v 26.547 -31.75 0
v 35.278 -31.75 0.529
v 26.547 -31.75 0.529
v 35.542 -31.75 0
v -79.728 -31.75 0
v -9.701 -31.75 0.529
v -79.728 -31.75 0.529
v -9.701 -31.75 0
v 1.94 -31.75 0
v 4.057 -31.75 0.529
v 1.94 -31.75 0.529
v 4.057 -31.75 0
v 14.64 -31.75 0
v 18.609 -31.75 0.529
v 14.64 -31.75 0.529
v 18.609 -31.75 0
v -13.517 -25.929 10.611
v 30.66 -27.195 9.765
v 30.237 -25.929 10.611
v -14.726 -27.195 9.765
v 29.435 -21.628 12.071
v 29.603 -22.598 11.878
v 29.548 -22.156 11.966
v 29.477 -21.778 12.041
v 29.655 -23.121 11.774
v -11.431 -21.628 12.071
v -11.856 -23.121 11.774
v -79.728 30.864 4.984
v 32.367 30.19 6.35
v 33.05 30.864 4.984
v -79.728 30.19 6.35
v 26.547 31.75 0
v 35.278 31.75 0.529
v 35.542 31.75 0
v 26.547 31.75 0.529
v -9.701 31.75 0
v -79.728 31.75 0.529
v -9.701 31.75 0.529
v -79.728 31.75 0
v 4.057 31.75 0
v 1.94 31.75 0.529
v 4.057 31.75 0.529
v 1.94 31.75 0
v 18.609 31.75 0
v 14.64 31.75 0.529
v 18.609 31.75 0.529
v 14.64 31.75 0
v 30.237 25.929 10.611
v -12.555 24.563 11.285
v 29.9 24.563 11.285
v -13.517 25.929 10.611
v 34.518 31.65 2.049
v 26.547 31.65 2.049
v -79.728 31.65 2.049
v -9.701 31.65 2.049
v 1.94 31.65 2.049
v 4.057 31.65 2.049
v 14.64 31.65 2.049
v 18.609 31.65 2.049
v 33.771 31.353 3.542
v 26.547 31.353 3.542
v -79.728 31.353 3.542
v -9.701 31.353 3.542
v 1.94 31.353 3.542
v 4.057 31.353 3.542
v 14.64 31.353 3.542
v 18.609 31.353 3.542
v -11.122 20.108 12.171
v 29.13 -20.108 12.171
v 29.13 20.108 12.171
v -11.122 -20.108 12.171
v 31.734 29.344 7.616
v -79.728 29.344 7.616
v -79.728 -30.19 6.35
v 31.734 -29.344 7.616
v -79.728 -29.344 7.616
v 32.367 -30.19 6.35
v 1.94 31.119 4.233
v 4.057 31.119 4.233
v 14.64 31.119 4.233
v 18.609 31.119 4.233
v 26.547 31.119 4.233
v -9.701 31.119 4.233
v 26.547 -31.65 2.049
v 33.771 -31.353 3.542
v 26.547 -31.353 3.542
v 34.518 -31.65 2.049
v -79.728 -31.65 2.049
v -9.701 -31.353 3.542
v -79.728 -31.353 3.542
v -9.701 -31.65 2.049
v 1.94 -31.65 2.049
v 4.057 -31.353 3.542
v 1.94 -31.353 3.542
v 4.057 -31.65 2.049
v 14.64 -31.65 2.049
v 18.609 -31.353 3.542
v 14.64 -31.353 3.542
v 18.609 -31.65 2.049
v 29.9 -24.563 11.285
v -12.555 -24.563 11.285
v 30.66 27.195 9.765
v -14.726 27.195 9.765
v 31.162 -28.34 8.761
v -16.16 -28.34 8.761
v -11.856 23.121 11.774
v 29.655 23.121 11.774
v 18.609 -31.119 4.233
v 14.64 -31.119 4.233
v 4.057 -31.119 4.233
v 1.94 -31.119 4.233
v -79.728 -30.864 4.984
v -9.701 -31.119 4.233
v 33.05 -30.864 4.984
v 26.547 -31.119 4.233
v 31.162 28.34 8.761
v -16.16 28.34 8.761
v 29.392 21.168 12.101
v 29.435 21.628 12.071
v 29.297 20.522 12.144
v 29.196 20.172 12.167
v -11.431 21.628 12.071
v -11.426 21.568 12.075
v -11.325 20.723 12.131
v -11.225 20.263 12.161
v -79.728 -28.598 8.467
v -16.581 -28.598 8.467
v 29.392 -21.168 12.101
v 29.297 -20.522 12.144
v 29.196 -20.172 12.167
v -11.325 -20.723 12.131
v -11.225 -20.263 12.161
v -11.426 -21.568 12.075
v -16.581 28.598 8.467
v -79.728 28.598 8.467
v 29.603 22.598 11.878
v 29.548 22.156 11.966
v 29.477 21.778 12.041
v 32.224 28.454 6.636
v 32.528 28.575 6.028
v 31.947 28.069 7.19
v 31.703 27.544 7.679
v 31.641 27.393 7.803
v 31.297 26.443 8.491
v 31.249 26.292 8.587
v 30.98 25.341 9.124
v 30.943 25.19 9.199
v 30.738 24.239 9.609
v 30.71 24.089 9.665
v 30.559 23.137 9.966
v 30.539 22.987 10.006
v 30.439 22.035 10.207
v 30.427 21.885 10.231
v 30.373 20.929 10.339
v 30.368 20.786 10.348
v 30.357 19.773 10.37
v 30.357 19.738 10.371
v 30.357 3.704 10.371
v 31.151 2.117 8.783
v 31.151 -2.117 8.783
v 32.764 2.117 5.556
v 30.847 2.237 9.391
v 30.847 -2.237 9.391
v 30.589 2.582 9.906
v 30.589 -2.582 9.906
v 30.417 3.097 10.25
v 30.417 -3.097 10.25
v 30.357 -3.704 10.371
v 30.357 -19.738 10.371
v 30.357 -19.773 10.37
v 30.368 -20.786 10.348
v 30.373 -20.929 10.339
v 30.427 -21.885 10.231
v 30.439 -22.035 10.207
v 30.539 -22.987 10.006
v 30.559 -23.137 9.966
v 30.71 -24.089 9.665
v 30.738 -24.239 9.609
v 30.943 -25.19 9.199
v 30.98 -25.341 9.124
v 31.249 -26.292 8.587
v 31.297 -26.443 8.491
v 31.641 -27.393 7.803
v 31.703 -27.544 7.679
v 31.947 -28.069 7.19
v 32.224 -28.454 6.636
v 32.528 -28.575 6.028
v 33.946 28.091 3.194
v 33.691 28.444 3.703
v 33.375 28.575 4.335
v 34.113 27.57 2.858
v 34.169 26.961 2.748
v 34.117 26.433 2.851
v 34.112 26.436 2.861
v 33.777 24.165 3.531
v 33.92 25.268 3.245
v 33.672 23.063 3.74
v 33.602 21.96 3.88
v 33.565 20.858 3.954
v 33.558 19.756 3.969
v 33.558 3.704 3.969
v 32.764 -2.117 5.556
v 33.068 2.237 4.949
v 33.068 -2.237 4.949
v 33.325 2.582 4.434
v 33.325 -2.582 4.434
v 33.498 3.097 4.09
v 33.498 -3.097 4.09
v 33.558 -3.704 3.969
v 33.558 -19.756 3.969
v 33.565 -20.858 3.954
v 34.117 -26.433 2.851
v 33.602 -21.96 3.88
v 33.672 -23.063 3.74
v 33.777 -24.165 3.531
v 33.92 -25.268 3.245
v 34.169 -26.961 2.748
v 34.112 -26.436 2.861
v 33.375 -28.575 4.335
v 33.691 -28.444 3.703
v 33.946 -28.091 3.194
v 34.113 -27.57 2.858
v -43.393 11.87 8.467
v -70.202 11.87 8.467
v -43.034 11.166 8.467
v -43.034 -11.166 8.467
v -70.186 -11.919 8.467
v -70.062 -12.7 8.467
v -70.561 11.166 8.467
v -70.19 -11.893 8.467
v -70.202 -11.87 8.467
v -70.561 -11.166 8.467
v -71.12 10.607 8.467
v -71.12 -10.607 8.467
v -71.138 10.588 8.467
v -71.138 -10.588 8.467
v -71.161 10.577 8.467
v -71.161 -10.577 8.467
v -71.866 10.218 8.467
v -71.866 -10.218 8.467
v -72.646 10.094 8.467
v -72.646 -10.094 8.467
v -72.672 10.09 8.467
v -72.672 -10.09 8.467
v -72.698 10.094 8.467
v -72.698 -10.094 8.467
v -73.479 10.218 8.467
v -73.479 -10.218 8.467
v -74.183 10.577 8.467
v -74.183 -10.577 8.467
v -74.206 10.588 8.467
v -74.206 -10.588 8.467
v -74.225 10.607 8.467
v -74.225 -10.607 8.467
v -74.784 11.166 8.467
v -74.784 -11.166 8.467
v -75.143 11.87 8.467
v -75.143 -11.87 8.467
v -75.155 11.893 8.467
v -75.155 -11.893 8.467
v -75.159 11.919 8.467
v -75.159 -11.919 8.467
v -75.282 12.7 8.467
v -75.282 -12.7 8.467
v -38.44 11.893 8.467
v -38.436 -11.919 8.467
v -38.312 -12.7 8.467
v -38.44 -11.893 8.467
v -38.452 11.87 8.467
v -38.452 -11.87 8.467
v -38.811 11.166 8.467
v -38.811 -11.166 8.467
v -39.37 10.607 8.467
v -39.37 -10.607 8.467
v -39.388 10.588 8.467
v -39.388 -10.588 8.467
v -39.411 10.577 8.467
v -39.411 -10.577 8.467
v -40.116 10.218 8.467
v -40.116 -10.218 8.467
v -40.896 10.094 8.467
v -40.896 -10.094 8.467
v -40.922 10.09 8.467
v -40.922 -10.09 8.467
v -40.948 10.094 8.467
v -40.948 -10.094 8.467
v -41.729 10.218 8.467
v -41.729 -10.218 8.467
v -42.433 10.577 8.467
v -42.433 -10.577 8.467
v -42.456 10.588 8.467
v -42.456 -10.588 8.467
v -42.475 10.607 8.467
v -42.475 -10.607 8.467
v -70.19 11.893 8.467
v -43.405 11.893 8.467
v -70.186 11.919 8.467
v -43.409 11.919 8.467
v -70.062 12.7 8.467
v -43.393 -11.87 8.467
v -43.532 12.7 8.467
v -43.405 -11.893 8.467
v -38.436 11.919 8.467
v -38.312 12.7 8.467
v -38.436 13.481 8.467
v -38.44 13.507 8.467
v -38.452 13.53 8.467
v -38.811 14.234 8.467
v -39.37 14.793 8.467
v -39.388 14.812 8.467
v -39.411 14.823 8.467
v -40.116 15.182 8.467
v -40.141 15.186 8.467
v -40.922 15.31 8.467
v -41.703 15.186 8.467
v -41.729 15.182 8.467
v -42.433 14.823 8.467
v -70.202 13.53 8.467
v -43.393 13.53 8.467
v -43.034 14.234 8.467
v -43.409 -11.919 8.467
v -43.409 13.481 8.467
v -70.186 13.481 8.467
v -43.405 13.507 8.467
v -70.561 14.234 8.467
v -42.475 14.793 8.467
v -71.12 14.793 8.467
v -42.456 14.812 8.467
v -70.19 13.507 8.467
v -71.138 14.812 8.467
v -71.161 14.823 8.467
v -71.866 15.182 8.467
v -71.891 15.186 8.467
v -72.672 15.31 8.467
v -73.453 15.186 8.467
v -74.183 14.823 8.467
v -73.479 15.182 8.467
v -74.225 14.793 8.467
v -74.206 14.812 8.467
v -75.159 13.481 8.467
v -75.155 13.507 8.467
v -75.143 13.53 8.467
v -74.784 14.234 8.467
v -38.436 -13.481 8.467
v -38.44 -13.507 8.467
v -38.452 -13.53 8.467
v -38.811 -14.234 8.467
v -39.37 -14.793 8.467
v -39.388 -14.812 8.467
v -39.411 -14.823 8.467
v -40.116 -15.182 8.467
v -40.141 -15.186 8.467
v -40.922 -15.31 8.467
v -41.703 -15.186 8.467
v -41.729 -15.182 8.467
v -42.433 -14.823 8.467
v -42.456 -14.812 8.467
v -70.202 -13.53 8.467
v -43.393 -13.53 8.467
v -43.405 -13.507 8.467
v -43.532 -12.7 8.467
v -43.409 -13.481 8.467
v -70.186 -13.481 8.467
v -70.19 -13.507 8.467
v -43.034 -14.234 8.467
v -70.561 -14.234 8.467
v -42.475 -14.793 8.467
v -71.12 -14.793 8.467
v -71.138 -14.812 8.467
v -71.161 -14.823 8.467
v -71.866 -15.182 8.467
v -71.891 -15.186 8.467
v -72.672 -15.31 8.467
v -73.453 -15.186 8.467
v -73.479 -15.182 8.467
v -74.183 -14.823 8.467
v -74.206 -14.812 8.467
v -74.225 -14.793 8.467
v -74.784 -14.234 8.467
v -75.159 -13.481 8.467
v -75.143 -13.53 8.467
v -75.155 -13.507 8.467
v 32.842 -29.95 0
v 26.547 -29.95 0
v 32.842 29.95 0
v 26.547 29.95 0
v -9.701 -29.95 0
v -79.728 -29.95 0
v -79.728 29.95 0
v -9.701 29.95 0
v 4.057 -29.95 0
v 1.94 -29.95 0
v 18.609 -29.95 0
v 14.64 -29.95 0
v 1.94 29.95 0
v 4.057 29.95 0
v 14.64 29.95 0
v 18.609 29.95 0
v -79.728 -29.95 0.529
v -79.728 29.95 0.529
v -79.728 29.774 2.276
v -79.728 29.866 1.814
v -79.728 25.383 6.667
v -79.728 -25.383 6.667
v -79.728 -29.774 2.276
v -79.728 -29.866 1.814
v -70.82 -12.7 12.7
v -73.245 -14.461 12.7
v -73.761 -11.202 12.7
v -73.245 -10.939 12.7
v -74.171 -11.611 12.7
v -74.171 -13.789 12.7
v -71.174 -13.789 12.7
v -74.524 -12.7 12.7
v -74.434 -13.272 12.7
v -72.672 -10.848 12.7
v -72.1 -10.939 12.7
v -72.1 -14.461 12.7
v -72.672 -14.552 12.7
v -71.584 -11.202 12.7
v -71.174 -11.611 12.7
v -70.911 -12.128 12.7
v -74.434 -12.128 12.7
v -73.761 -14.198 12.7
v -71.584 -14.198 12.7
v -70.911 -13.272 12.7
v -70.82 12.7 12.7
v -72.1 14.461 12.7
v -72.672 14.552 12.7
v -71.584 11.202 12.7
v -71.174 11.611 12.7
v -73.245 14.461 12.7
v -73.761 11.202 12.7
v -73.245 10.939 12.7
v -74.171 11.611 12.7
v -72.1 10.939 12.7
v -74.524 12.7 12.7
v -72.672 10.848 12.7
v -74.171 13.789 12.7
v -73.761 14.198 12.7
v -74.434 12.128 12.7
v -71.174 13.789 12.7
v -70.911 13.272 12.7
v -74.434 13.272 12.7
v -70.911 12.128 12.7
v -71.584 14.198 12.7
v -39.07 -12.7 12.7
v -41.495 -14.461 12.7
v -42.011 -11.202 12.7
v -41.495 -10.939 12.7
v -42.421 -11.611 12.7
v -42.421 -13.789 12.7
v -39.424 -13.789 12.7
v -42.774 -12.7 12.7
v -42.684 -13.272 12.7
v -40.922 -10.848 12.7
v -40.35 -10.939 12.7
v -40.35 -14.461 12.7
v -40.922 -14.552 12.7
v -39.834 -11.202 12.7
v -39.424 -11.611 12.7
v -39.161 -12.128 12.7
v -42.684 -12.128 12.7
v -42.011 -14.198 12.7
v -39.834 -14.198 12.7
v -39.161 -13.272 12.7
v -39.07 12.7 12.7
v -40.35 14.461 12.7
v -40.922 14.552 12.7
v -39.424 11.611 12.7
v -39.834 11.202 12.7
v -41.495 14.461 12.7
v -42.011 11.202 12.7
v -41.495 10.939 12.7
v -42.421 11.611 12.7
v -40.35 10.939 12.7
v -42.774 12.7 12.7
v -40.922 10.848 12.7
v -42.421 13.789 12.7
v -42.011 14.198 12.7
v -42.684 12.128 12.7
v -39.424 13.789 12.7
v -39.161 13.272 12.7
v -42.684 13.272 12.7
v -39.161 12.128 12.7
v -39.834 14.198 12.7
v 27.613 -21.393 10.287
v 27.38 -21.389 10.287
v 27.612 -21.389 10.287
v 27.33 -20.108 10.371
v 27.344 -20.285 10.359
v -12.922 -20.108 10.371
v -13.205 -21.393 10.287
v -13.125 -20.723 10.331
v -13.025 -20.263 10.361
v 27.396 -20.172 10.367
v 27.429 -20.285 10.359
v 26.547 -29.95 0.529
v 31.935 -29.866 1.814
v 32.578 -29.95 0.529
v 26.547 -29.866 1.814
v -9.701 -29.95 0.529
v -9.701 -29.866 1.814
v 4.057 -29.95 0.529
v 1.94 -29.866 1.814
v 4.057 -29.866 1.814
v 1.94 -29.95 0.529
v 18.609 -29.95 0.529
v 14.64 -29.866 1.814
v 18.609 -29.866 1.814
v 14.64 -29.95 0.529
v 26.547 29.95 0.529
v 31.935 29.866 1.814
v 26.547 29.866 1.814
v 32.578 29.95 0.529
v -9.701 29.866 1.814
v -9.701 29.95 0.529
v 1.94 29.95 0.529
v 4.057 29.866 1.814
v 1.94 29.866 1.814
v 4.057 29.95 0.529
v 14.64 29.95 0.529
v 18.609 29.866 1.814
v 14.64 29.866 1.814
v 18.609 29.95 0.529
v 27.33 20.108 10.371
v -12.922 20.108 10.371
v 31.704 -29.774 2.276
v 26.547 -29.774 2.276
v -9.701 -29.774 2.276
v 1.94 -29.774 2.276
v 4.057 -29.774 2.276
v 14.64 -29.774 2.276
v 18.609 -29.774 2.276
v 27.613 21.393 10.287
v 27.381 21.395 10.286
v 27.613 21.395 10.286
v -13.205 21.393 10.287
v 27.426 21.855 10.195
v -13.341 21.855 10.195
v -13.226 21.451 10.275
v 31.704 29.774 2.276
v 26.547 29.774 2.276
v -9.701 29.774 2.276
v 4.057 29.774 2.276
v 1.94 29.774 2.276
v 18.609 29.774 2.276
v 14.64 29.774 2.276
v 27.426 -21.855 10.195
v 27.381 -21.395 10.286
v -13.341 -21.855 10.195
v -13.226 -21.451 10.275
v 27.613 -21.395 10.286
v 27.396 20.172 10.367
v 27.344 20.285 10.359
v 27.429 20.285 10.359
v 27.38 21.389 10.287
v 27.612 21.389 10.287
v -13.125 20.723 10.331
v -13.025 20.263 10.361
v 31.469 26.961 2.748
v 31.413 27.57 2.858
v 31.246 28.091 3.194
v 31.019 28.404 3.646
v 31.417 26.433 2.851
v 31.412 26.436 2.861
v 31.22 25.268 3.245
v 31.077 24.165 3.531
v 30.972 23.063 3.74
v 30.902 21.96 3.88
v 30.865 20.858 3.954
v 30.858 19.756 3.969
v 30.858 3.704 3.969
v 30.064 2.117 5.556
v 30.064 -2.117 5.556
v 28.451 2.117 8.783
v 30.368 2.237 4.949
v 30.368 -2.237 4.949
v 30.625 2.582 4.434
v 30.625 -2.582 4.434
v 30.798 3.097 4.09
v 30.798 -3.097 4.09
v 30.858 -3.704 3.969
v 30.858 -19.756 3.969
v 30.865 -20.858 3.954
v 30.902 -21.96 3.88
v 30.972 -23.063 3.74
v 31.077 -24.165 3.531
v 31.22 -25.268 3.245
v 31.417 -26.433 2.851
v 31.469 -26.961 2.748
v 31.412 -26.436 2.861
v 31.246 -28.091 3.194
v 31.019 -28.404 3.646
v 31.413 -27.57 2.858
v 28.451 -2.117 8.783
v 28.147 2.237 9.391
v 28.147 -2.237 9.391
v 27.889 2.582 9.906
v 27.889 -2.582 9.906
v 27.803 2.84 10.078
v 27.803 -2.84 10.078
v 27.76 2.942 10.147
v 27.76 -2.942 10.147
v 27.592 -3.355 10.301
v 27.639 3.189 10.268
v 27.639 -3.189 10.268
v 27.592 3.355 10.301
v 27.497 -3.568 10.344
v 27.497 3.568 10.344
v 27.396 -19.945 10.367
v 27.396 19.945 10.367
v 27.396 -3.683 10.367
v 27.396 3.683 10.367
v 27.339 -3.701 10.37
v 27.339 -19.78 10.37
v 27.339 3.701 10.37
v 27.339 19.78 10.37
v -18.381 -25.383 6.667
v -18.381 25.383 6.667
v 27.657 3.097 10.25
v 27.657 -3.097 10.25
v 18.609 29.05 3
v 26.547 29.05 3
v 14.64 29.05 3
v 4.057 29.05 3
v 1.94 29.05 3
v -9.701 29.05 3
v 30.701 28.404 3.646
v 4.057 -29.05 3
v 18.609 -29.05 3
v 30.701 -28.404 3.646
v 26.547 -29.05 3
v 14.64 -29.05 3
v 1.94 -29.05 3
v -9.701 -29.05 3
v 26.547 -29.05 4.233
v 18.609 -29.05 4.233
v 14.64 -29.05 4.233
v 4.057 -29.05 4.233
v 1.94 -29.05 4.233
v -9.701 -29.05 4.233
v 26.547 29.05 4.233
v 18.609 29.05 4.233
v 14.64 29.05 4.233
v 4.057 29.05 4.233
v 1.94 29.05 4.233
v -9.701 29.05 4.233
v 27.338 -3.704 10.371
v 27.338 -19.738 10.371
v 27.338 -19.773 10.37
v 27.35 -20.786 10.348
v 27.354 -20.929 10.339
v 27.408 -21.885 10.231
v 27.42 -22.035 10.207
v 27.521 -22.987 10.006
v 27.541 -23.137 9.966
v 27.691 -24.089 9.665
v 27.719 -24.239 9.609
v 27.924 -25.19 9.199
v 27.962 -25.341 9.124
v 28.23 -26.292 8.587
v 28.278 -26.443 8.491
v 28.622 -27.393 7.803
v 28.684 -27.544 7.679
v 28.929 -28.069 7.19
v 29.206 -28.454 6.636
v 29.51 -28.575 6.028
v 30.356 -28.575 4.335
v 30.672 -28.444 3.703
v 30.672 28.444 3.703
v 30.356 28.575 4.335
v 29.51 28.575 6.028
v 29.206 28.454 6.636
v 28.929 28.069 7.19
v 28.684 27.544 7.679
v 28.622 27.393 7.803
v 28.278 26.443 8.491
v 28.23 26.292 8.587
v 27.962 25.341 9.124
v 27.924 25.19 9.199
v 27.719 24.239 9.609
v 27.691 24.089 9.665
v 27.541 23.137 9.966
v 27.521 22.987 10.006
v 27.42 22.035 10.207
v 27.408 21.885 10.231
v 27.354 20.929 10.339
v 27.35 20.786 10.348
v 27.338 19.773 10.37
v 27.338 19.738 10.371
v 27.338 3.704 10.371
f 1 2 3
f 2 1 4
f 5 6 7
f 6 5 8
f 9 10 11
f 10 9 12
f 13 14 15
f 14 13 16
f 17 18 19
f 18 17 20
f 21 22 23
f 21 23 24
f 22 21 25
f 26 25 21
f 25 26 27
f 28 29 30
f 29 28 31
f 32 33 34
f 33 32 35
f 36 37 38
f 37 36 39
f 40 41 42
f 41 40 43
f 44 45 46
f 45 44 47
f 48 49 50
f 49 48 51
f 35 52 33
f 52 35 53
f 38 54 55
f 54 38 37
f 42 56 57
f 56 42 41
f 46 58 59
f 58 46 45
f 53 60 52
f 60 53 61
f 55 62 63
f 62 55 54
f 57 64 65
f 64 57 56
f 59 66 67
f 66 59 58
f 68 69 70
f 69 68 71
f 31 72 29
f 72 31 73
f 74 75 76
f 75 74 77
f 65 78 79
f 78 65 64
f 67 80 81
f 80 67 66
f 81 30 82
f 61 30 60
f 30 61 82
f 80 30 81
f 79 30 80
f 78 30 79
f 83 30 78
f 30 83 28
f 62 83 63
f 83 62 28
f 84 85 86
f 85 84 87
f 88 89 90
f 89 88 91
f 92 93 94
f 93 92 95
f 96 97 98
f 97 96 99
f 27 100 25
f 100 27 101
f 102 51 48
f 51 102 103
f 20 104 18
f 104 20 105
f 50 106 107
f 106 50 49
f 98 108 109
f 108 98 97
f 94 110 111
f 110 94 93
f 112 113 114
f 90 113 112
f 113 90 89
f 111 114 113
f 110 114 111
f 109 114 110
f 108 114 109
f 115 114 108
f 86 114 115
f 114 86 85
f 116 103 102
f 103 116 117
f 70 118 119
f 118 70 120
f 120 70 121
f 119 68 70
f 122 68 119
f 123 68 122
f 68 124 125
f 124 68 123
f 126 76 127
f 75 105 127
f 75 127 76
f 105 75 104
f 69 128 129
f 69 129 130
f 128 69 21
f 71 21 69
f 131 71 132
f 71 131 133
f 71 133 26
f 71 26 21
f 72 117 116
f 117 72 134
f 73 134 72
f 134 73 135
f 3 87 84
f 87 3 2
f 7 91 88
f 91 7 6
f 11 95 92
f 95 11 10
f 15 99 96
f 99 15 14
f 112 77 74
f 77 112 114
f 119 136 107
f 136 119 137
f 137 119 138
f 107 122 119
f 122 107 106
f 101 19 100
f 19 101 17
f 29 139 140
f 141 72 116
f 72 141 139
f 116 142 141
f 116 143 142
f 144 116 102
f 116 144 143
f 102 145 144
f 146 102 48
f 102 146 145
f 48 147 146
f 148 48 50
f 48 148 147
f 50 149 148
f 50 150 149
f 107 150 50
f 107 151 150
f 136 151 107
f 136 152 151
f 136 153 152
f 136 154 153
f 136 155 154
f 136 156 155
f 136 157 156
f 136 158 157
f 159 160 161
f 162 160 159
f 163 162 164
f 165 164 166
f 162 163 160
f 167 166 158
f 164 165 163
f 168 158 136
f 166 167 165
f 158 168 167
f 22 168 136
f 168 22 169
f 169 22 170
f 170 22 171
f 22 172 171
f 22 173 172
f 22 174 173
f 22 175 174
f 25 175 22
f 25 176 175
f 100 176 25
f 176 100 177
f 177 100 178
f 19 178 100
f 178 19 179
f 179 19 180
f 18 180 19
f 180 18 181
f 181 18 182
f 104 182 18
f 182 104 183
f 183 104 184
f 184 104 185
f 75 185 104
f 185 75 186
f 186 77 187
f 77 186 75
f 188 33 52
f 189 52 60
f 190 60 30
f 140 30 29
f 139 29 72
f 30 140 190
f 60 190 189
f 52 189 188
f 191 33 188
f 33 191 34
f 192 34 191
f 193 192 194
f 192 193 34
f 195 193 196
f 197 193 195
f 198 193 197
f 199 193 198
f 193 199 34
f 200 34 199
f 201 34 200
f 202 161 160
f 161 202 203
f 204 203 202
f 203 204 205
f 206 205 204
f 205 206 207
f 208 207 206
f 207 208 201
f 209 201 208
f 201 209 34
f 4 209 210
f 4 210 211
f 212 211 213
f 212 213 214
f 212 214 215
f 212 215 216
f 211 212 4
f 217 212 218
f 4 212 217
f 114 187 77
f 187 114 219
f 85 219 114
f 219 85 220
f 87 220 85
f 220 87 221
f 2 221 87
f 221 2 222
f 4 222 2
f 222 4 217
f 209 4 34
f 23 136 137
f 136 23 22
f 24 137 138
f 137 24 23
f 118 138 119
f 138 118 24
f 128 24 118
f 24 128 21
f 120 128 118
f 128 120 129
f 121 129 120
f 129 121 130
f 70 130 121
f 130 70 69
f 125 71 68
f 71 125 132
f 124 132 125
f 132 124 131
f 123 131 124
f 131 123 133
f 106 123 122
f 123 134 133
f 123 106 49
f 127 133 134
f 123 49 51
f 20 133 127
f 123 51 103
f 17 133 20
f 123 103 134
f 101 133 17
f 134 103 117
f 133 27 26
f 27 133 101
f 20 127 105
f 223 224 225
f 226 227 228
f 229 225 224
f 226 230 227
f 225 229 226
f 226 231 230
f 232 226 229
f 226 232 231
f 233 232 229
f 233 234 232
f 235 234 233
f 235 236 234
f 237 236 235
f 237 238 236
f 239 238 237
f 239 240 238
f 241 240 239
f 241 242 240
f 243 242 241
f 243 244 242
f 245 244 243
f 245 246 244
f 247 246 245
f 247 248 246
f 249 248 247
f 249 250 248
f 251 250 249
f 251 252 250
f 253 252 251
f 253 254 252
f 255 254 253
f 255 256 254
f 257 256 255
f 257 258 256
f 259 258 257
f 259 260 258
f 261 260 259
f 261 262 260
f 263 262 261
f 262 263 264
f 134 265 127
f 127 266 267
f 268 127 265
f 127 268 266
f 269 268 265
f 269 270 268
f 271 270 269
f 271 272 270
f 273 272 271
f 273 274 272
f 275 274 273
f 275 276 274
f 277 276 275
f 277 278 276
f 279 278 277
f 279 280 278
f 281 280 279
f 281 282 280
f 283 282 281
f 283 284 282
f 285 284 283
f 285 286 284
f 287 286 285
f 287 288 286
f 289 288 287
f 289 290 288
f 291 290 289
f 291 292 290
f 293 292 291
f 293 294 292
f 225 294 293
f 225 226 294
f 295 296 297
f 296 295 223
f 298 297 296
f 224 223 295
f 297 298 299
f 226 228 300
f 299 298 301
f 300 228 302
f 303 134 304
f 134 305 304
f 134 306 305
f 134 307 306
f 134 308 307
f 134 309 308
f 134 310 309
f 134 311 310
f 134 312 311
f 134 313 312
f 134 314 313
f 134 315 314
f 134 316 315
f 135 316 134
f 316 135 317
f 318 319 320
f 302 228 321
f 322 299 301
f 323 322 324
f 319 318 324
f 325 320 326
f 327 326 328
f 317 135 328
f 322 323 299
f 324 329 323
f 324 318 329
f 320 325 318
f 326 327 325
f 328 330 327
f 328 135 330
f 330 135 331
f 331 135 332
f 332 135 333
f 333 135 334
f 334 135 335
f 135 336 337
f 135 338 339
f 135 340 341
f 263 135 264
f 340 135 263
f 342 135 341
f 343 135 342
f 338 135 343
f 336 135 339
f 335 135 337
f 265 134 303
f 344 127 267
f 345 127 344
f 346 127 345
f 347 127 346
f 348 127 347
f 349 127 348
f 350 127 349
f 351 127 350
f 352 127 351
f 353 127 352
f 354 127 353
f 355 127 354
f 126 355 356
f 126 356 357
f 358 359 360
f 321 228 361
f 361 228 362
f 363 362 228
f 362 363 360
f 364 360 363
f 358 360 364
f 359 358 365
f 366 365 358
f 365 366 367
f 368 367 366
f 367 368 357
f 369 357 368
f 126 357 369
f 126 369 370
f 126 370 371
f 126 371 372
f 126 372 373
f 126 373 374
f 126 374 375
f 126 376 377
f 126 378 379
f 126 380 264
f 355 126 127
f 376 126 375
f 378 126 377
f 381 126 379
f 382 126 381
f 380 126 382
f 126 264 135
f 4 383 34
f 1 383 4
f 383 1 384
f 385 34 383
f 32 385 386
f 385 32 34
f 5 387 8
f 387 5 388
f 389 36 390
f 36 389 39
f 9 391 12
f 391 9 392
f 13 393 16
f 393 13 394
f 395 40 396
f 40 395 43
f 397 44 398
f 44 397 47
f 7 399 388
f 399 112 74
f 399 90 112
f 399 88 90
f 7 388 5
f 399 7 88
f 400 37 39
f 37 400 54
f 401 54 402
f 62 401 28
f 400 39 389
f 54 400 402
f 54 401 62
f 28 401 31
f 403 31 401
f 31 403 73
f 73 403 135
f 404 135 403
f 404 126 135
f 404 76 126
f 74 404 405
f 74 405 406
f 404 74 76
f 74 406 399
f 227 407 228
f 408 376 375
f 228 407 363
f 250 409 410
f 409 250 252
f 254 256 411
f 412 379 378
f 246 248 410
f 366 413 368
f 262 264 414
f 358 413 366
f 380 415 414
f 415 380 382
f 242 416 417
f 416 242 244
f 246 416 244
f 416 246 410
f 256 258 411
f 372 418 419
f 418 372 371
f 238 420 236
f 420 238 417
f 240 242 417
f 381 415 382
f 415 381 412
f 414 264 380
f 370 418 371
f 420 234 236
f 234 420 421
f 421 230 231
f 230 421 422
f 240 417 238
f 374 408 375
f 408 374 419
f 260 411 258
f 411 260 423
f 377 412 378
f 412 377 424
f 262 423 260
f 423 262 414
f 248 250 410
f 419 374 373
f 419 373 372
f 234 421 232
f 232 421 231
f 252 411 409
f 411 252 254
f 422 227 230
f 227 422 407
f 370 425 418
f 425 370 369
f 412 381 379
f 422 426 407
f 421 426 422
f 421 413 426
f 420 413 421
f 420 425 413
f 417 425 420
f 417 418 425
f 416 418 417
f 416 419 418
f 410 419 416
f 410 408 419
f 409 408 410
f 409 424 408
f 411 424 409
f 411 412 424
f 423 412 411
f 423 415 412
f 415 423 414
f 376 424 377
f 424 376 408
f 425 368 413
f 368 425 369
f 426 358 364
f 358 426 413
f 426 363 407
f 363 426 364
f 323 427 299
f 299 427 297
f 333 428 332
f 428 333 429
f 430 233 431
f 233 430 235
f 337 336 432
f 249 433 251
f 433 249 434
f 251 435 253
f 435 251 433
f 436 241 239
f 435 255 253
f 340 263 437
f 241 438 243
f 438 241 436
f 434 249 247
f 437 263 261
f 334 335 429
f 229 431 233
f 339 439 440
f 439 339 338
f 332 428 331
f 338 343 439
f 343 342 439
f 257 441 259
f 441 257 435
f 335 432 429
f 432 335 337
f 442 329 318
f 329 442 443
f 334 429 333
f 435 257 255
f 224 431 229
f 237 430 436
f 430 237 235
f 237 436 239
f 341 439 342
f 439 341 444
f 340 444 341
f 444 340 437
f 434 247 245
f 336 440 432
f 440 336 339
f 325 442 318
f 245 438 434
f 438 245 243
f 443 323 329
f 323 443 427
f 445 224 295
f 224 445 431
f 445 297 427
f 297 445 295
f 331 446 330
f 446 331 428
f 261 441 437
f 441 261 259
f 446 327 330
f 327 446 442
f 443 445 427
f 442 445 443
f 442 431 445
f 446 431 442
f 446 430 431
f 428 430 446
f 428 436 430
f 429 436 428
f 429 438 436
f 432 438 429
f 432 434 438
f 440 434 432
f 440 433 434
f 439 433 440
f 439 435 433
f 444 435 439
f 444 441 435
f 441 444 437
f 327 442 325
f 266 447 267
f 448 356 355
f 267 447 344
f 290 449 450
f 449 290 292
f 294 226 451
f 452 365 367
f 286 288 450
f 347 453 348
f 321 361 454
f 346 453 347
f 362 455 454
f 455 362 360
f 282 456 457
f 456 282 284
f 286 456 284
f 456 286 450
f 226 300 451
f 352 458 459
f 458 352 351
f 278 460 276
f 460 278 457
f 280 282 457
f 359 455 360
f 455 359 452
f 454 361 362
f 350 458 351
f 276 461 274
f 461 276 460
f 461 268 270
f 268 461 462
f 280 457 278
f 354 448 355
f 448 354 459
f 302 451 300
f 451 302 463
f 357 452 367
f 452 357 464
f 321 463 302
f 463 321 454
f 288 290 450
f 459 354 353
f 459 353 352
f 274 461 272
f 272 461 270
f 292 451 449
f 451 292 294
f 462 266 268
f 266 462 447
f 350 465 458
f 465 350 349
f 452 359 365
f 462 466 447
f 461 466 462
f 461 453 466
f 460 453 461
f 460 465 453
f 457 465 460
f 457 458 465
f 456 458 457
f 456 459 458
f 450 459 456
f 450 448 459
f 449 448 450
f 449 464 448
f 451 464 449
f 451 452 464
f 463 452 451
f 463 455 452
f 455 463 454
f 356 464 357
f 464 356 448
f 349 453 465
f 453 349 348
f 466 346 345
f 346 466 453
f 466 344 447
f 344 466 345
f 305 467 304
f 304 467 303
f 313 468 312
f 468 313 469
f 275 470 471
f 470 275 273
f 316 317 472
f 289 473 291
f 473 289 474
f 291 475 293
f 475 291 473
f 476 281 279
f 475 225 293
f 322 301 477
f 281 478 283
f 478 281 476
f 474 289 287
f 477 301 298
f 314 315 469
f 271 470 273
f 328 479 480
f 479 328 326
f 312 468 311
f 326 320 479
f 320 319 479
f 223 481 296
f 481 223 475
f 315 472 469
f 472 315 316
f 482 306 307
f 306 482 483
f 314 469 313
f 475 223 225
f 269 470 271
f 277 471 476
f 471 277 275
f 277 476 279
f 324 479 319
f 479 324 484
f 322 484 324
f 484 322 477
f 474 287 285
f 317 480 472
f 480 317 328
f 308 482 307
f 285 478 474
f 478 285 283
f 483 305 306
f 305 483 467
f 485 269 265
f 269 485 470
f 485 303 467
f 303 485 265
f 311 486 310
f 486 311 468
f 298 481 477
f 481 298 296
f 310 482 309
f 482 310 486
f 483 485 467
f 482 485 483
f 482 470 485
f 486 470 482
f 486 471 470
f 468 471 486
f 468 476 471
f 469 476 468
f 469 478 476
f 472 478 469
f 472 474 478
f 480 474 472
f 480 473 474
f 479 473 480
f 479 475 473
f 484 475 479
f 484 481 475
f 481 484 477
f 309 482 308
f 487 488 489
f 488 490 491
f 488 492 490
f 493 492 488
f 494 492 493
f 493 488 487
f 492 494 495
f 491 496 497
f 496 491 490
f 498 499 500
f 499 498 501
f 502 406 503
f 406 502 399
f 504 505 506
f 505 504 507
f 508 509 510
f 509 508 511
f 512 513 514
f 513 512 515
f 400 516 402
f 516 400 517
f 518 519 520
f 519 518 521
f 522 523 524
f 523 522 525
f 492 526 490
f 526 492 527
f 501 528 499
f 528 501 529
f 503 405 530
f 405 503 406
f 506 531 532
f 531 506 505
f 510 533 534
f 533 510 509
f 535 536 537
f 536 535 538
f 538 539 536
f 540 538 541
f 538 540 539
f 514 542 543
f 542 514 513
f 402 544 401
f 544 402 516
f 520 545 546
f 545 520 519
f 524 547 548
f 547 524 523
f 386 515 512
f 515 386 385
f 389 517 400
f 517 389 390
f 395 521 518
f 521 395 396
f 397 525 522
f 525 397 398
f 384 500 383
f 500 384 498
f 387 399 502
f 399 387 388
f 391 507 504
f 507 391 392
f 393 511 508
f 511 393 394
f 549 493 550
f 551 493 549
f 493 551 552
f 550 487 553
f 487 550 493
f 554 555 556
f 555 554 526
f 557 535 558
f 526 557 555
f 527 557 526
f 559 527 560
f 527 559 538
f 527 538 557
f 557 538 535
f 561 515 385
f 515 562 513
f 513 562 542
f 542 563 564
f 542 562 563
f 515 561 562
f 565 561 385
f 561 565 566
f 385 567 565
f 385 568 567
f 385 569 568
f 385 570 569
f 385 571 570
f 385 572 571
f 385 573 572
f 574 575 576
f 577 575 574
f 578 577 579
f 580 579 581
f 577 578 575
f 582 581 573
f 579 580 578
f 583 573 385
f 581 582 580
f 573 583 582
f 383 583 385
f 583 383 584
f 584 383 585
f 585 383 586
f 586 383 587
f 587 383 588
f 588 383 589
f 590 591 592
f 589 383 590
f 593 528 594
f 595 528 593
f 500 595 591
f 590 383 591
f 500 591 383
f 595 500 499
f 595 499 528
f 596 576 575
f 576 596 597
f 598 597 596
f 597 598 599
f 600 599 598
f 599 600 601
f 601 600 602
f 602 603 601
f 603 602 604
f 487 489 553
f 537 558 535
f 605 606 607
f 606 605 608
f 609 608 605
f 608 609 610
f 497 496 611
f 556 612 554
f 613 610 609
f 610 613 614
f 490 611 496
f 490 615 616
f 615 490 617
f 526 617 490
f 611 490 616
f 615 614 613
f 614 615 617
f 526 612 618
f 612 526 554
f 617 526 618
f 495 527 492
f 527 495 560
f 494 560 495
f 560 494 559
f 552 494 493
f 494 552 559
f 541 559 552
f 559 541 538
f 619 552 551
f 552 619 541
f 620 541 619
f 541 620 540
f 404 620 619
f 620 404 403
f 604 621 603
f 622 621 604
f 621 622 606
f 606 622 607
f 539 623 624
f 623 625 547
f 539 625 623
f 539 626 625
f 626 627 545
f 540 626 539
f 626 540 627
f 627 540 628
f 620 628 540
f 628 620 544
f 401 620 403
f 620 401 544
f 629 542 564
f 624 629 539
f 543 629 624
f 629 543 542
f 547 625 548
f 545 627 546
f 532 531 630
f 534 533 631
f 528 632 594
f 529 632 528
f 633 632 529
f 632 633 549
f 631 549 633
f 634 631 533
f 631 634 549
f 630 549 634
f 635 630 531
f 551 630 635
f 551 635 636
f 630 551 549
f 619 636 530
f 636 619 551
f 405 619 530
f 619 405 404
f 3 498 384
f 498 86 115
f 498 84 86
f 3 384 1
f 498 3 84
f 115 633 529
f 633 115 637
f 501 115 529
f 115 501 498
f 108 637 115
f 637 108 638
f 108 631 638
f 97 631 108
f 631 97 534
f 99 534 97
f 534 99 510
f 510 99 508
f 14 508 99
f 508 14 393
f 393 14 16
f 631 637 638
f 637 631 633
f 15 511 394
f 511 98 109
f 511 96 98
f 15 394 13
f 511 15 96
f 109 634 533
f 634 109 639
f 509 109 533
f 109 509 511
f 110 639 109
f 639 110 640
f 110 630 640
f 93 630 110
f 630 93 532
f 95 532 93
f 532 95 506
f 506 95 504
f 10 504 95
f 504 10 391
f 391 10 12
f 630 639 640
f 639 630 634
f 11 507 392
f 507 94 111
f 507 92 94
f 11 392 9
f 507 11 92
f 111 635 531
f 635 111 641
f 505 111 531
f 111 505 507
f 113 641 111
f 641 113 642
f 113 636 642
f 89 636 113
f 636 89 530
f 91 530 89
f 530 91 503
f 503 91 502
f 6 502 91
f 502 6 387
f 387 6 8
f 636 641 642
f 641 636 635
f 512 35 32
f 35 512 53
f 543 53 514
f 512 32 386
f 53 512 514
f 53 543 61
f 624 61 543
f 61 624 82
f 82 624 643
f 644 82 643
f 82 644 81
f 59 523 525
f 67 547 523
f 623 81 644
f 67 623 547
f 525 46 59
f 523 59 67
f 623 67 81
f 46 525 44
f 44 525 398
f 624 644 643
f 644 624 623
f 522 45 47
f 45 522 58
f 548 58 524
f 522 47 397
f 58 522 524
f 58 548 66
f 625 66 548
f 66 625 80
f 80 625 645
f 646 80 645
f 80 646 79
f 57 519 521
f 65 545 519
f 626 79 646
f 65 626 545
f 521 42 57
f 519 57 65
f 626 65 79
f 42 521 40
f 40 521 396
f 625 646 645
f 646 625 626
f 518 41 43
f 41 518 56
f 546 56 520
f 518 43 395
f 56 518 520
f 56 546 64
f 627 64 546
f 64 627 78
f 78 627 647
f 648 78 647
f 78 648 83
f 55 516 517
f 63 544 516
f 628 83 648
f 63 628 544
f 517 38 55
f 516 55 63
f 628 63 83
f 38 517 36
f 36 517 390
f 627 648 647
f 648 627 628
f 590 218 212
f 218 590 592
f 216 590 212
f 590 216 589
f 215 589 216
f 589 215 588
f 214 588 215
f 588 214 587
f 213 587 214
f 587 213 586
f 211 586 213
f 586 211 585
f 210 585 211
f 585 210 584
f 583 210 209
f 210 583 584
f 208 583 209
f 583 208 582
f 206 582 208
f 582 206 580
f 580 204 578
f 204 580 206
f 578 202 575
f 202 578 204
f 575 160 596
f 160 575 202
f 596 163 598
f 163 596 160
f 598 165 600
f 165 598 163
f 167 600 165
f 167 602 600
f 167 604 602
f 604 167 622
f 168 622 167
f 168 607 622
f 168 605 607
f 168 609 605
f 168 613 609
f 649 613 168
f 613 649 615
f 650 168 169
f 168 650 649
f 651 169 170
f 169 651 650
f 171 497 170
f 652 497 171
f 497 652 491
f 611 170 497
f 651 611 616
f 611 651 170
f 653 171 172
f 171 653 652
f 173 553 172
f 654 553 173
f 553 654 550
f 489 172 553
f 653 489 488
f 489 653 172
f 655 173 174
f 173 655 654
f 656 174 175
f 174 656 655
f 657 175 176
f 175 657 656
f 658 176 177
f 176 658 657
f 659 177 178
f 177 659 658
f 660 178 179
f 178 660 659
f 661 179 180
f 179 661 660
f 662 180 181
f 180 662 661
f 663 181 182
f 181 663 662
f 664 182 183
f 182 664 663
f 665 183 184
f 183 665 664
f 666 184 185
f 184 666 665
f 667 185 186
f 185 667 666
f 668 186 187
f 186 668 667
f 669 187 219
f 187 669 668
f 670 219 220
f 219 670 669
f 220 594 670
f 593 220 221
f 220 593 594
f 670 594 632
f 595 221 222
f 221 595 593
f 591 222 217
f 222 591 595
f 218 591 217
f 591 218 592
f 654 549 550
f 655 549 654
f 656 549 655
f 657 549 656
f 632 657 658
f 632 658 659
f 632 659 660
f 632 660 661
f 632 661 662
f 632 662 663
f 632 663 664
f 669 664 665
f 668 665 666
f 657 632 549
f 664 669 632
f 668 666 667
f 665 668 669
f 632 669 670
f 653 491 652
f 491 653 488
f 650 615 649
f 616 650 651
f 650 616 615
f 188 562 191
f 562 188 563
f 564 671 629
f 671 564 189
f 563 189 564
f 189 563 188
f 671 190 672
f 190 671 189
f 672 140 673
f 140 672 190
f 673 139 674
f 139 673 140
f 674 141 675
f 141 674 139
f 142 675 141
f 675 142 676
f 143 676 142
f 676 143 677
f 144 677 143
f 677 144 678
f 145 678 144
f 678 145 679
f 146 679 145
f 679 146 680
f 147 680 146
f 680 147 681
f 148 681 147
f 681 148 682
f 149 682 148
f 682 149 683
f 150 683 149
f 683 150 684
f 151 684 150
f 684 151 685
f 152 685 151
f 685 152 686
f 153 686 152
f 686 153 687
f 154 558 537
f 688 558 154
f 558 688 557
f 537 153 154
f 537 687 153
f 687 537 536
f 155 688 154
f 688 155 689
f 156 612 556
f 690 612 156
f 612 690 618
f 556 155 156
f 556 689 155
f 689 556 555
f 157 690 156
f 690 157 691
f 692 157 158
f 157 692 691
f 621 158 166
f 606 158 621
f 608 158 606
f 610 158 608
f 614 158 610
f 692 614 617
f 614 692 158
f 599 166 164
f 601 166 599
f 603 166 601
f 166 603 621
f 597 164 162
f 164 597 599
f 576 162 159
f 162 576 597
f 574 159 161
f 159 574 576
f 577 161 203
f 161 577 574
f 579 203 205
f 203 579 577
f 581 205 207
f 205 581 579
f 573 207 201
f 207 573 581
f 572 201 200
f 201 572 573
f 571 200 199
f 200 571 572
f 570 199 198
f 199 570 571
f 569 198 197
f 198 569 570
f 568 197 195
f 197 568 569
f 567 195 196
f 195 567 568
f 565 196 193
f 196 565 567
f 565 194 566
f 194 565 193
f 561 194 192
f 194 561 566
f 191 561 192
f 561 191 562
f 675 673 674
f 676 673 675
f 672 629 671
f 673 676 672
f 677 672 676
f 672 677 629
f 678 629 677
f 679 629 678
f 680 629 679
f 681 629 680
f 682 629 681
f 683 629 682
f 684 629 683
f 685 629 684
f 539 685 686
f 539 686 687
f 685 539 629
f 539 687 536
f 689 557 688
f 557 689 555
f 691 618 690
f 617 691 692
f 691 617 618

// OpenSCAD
// Milwaukee Road Little Joe, O scale 1-48 - print 6 of 17: roof_3 - roof, section 3 (print upright)
// Render (F6), export STL, print. Settings: ../../library/lj_params.scad
// Whole loco preview and notes: ../../MILW_LittleJoe_Main.scad
SCALE_SEL = "O";
LOCO_SEL = "E70";   // [E20, E21, E70, E71, E72, E73, E74, E75, E76, E77, E78, E79] the body and roof change for E20 / E21
include <../../library/lj_all.scad>
lj_plate("roof_3");
